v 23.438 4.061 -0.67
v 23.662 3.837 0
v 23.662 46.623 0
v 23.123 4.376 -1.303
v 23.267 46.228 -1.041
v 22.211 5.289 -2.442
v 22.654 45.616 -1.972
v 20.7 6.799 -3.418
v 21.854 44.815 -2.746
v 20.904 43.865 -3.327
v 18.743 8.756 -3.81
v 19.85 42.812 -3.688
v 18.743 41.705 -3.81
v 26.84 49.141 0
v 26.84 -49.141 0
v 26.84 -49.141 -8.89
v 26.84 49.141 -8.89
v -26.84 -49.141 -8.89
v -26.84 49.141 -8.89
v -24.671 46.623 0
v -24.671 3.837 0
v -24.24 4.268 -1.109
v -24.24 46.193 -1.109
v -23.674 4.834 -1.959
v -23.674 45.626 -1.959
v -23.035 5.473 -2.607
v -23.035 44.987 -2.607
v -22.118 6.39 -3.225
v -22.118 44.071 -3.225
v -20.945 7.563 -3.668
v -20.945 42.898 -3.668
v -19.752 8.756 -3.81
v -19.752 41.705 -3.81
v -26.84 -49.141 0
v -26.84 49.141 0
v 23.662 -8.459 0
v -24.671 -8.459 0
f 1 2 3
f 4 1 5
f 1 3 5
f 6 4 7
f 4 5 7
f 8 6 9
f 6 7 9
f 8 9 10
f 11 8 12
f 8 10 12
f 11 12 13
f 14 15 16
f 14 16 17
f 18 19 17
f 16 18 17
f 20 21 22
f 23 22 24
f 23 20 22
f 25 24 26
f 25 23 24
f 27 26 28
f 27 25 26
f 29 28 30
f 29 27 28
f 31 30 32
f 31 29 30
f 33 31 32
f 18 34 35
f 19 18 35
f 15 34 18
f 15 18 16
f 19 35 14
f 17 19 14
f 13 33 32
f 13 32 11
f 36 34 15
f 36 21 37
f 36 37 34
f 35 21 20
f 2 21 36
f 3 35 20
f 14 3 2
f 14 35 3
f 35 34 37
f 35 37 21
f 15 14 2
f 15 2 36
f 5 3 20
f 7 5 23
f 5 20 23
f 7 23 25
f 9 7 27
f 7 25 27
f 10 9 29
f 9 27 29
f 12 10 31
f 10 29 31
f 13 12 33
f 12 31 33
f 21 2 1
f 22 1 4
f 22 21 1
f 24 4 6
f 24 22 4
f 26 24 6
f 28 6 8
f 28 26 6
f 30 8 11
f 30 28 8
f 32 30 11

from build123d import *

# Parameters (mm, degrees)
F0_W        = 53.6803901196
F0_H        = 98.2824712992
F1_DEPTH    = 8.89
F2_W        = 48.3321249485
F2_H        = 42.7858147305
F3_DEPTH    = 3.81
F4_T1_DEPTH = 48.3321249485
F4_T3_DEPTH = 55.0825368547


# Not quite as in the source:
# - a fillet or chamfer that OpenCascade refuses, or shapes differently, is made with other operations: its cross-section is extruded or revolved along the edge and cut away or added


with BuildPart() as f1:
    # F0 (on Top) → F1 (new body)
    with BuildSketch(Plane.XY):
        Rectangle(F0_W, F0_H)
    extrude(amount=-F1_DEPTH)

    # F2 (on Top) → F3 (cut)
    with BuildSketch(Plane.XY):
        with Locations((-0.504437834, 25.230371044)):
            Rectangle(F2_W, F2_H)
    extrude(amount=-F3_DEPTH, mode=Mode.SUBTRACT)

    # F4: fillet of radius 5.08 on 4 edges, made by hand

    # F4_s2 → F4_t1 (join)
    with BuildSketch(Plane.YZ.offset(-24.6705003083)):
        with BuildLine():
            ThreePointArc((46.6232784092, 0), (44.8154415329, -2.7460926284), (41.7045895596, -3.81))
            Line((41.7045895596, -3.81), (46.6232784092, -3.81))
            Line((46.6232784092, -3.81), (46.6232784092, 0))
        make_face()
        with BuildLine():
            ThreePointArc((3.8374636788, 0), (5.6453005551, -2.7460926284), (8.7561525285, -3.81))
            Line((8.7561525285, -3.81), (3.8374636788, -3.81))
            Line((3.8374636788, -3.81), (3.8374636788, 0))
        make_face()
    extrude(amount=F4_T1_DEPTH)

    # F4_s4 → F4_t3 (join)
    with BuildSketch(Plane.XZ.offset(-46.6232784092)):
        with BuildLine():
            ThreePointArc((-24.6705003083, 0), (-22.8626634319, -2.7460926284), (-19.7518114586, -3.81))
            Line((-19.7518114586, -3.81), (-24.6705003083, -3.81))
            Line((-24.6705003083, -3.81), (-24.6705003083, 0))
        make_face()
        with BuildLine():
            ThreePointArc((23.6616246402, 0), (21.8537877639, -2.7460926284), (18.7429357905, -3.81))
            Line((18.7429357905, -3.81), (23.6616246402, -3.81))
            Line((23.6616246402, -3.81), (23.6616246402, 0))
        make_face()
    extrude(amount=F4_T3_DEPTH)


solid = f1.part
